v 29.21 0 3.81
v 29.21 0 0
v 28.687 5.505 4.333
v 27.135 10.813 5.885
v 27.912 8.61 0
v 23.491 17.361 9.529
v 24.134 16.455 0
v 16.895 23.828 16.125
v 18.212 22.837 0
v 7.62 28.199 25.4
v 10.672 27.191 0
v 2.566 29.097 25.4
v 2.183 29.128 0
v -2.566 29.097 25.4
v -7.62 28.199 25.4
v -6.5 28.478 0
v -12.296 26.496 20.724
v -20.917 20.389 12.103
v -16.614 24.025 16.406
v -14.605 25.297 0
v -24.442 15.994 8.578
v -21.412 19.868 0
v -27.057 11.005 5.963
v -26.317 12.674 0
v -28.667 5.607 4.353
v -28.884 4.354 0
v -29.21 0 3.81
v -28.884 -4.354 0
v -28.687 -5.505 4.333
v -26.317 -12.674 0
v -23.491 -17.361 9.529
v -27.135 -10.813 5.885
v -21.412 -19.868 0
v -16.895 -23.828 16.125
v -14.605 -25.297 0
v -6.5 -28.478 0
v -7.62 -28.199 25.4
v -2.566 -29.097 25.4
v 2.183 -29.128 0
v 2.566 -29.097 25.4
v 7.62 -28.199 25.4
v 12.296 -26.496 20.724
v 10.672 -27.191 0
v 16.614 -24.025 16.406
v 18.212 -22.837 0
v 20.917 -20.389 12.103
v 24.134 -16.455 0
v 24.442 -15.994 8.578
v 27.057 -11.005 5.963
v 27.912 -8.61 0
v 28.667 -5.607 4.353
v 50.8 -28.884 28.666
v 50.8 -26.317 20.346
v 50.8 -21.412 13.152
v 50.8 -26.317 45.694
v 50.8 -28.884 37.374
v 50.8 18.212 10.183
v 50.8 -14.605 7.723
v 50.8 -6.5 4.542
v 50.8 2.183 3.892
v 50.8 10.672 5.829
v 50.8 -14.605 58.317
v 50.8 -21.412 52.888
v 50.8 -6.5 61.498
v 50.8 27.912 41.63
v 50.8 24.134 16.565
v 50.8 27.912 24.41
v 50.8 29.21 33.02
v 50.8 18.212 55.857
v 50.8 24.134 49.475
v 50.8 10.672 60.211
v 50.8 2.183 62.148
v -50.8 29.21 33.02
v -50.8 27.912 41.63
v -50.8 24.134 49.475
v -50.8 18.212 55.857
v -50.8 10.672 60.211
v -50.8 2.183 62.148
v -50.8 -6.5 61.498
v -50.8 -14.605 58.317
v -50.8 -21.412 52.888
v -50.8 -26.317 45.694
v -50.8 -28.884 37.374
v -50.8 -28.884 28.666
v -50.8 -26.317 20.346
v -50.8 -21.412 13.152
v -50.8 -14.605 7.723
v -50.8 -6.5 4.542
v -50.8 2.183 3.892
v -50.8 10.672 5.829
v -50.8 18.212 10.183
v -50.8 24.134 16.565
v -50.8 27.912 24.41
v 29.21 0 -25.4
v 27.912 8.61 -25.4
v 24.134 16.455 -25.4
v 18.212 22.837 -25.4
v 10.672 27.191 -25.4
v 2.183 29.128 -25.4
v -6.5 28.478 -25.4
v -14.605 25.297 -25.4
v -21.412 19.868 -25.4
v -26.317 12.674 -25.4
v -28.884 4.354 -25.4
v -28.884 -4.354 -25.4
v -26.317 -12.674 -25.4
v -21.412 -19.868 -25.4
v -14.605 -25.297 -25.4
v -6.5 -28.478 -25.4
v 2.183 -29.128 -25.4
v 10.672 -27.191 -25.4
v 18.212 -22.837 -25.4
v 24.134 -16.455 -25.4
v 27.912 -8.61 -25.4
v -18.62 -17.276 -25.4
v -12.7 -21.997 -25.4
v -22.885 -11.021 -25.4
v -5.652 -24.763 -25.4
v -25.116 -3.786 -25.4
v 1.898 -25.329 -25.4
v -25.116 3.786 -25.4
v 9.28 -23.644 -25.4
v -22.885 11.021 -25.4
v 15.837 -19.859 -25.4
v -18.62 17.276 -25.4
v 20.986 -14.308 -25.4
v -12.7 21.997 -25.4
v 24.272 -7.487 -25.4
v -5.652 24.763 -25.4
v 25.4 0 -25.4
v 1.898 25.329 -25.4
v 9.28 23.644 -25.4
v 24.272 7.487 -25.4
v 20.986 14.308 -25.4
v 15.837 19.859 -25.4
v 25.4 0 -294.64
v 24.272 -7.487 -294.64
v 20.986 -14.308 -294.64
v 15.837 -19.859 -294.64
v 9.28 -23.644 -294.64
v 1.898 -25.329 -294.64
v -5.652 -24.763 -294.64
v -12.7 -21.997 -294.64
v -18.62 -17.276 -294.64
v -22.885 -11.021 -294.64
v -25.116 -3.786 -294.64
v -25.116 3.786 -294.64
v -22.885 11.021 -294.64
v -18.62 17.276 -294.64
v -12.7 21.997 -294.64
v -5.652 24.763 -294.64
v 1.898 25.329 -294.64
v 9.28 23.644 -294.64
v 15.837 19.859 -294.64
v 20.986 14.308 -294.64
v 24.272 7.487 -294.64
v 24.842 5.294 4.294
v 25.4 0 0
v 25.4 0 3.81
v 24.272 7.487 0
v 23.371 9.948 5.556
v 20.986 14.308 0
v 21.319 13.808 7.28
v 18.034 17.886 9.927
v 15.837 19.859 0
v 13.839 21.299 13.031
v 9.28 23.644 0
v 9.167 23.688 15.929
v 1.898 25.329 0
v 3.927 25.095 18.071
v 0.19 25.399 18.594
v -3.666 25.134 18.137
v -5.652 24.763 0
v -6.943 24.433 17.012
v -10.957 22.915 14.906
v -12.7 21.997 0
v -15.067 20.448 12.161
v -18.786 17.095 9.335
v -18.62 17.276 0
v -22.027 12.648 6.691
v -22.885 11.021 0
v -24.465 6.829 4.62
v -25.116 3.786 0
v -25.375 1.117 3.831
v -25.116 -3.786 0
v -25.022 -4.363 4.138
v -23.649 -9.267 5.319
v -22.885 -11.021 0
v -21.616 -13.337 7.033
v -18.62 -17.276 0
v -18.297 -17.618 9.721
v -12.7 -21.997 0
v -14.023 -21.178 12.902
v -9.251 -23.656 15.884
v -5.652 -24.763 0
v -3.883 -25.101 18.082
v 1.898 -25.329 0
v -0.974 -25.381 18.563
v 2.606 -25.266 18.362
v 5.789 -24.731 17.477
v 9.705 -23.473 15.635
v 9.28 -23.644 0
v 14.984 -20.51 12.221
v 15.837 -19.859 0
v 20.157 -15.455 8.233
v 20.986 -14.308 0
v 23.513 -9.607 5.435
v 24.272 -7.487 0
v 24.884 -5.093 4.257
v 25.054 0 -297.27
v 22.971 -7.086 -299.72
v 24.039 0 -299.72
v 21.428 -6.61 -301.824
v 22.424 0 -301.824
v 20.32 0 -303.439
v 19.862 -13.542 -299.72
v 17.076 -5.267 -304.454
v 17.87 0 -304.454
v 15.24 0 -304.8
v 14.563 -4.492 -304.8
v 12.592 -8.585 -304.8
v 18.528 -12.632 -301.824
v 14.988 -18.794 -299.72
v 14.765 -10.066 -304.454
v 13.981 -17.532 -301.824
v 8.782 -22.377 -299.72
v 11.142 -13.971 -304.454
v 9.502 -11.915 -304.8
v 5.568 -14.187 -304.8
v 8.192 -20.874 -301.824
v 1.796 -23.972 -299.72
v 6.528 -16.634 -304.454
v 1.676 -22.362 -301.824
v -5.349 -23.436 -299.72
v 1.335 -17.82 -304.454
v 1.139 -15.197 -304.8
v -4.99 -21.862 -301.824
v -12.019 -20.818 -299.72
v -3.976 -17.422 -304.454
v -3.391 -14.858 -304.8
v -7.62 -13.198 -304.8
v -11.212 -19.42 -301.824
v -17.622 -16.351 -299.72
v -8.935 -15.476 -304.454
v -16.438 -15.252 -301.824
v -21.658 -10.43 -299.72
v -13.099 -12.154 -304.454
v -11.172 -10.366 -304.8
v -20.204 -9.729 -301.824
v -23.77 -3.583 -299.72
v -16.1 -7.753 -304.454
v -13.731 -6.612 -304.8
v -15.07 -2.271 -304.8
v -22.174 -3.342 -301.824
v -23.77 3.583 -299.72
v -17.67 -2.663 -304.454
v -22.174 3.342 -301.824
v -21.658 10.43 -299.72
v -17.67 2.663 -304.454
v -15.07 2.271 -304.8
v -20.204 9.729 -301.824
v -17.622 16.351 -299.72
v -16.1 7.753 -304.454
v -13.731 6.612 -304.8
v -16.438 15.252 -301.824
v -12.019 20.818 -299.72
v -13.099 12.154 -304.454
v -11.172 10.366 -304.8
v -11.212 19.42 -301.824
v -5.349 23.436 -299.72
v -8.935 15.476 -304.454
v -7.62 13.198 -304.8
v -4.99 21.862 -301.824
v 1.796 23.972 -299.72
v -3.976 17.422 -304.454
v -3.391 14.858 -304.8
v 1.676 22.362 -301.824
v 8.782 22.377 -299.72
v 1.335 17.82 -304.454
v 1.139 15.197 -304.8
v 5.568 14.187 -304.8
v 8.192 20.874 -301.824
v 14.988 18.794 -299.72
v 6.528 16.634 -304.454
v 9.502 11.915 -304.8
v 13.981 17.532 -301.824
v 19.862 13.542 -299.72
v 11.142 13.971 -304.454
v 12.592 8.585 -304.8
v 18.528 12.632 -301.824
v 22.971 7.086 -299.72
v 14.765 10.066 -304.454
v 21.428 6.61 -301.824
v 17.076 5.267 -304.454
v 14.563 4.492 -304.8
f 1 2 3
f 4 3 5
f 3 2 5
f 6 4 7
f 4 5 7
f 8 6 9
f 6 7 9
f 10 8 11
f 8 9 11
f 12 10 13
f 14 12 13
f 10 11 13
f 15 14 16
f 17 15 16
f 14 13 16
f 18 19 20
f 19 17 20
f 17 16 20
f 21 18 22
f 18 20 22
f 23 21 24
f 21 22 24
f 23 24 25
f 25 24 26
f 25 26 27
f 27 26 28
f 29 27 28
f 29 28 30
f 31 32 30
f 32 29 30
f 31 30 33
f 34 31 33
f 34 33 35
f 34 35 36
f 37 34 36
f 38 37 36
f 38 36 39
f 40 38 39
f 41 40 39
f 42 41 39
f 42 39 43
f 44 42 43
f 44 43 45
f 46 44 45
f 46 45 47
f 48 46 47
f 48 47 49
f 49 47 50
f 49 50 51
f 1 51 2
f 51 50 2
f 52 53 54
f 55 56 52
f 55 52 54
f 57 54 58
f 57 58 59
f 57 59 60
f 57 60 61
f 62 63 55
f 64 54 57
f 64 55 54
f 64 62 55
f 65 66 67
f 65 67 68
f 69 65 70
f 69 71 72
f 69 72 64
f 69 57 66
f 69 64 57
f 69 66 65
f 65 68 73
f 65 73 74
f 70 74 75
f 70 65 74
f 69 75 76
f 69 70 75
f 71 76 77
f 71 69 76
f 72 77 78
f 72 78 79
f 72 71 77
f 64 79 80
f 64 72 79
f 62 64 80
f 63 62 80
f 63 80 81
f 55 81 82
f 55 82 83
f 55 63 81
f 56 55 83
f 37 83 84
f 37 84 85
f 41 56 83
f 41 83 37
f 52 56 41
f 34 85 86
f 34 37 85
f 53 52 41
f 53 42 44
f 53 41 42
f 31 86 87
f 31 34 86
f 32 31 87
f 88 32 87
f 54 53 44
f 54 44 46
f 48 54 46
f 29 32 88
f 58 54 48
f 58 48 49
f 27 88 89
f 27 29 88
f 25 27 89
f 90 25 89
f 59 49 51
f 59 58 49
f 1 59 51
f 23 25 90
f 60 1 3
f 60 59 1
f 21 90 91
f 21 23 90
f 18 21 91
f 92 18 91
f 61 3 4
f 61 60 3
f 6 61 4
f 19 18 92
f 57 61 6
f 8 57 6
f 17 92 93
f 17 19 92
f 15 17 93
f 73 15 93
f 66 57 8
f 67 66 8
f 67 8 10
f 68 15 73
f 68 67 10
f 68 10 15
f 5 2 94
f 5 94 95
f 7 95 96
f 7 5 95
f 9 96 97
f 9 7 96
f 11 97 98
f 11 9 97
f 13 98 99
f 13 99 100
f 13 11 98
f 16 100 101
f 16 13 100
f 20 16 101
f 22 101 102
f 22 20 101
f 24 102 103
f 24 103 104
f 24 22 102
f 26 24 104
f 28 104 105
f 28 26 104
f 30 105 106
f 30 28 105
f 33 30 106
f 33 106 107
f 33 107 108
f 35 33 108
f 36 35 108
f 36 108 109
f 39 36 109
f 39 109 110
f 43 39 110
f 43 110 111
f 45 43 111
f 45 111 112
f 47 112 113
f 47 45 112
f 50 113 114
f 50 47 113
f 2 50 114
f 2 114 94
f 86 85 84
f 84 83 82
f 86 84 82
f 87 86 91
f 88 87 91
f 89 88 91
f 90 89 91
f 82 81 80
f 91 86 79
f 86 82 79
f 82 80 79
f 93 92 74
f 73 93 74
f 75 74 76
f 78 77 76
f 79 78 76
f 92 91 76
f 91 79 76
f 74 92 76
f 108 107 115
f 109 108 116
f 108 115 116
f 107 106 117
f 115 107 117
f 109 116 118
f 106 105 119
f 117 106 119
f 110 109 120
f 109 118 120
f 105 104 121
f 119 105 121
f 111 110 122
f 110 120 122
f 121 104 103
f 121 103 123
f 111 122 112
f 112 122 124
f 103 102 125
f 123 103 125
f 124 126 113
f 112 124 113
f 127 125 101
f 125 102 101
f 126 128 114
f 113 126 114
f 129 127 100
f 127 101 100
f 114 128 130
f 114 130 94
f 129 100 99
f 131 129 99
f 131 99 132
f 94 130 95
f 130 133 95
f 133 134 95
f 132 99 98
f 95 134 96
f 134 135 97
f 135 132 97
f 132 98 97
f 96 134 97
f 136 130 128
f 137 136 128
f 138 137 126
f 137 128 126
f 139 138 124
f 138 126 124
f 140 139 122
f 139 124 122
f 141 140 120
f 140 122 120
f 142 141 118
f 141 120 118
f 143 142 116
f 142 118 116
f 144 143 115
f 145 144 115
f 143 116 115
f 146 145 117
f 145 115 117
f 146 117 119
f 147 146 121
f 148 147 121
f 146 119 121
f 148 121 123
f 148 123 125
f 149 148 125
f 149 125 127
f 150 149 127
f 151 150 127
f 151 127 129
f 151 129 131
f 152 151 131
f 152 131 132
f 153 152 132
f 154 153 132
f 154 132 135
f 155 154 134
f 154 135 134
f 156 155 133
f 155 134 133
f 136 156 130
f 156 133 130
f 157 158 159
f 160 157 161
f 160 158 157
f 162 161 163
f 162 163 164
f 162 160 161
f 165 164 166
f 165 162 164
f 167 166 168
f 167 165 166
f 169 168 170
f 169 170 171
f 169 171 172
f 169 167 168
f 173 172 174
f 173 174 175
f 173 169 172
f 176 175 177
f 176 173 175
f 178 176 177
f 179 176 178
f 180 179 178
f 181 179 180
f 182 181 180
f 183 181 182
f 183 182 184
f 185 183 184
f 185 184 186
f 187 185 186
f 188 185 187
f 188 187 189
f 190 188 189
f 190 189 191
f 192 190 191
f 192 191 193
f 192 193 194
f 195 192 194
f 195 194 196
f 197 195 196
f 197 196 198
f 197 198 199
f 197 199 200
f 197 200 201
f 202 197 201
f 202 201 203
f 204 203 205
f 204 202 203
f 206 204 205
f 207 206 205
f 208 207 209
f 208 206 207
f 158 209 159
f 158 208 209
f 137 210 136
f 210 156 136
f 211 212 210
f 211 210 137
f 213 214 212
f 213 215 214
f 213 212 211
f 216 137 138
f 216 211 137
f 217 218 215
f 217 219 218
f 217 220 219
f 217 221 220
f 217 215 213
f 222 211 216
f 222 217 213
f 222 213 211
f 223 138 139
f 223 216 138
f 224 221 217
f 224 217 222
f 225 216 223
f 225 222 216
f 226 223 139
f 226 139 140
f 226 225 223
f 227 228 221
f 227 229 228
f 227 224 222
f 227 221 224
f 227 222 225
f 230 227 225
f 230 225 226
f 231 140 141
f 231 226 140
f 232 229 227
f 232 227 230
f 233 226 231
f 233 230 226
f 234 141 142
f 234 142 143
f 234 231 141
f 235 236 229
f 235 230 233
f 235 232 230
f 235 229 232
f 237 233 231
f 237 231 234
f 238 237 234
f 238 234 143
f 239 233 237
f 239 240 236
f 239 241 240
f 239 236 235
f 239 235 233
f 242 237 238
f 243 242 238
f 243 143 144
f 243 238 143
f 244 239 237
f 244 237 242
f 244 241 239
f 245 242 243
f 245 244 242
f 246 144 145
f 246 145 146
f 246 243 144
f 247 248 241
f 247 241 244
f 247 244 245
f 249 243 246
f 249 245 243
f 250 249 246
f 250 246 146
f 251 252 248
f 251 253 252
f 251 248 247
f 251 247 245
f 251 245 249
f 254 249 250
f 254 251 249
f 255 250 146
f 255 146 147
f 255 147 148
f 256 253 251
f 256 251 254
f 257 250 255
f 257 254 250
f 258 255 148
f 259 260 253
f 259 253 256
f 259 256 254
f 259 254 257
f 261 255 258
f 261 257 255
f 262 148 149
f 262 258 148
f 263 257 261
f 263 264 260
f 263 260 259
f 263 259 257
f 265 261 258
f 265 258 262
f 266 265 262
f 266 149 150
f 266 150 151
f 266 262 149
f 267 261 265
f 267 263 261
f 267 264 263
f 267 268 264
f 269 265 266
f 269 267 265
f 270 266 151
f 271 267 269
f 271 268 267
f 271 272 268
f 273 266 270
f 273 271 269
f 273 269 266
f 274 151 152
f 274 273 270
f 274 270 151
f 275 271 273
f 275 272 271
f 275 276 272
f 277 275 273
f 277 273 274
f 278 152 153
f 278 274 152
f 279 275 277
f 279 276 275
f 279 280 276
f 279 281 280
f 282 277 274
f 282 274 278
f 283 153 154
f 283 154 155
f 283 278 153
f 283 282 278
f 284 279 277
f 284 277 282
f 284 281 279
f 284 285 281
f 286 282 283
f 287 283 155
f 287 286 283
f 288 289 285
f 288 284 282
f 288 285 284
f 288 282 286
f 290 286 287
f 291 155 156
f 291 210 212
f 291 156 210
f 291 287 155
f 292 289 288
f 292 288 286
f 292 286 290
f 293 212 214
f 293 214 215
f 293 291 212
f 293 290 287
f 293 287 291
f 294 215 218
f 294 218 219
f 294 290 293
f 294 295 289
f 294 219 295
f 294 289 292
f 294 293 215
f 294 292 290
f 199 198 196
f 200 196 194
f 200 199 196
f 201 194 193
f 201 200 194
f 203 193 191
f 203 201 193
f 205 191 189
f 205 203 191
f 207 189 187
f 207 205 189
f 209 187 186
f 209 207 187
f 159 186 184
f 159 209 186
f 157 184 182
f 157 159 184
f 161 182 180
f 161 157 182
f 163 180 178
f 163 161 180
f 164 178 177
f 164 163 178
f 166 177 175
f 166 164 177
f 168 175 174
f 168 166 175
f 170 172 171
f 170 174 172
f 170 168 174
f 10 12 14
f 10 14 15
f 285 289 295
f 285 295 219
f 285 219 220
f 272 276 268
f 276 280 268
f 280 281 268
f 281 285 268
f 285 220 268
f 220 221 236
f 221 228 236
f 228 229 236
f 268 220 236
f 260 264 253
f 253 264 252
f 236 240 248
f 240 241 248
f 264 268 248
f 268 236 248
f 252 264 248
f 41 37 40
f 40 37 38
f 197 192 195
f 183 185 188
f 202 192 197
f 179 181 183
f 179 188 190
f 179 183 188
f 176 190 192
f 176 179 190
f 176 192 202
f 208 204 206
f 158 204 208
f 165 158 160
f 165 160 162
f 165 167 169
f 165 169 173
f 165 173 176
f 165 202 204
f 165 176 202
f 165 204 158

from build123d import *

# Parameters (mm, degrees)
F2_R     = 29.21
F2_R_2   = 25.4
F3_DEPTH = 25.4
F4_DEPTH = 25.4
F5_R     = 29.21
F6_DEPTH = 38.1
F7_DEPTH = 50.8
F8_R     = 10.16


with BuildPart() as f1:
    # F0 (on Front) → F1 (revolve)
    with BuildSketch(Plane.XZ):
        Polygon((25.4, 0), (0, 0), (0, -75.989135), (0, -304.8), (25.4, -304.8), align=None)
    revolve(axis=Axis((0, 0, -37.994567), (0, 0, -1)))

    # F2 (on Top) → F3 (join)
    with BuildSketch(Plane.XY):
        Circle(F2_R)
        Circle(F2_R_2, mode=Mode.SUBTRACT)
    extrude(amount=-F3_DEPTH)

    # F2 (on Top) → F4 (join)
    with BuildSketch(Plane.XY):
        Circle(F2_R)
        Circle(F2_R_2, mode=Mode.SUBTRACT)
    extrude(amount=F4_DEPTH)

    # F5 (on Right) → F6 (cut, symmetric)
    with BuildSketch(Plane.YZ):
        with Locations((0, 33.02)):
            Circle(F5_R)
    extrude(amount=F6_DEPTH, both=True, mode=Mode.SUBTRACT)

    # F5 (on Right) → F7 (join, symmetric)
    with BuildSketch(Plane.YZ):
        with Locations((0, 33.02)):
            Circle(F5_R)
    extrude(amount=F7_DEPTH, both=True)

    # F8
    f8_edges = [f1.edges().sort_by_distance(p)[0] for p in [
        (-25.4, 0, -304.8),
    ]]
    fillet(f8_edges, radius=F8_R)


solid = f1.part
